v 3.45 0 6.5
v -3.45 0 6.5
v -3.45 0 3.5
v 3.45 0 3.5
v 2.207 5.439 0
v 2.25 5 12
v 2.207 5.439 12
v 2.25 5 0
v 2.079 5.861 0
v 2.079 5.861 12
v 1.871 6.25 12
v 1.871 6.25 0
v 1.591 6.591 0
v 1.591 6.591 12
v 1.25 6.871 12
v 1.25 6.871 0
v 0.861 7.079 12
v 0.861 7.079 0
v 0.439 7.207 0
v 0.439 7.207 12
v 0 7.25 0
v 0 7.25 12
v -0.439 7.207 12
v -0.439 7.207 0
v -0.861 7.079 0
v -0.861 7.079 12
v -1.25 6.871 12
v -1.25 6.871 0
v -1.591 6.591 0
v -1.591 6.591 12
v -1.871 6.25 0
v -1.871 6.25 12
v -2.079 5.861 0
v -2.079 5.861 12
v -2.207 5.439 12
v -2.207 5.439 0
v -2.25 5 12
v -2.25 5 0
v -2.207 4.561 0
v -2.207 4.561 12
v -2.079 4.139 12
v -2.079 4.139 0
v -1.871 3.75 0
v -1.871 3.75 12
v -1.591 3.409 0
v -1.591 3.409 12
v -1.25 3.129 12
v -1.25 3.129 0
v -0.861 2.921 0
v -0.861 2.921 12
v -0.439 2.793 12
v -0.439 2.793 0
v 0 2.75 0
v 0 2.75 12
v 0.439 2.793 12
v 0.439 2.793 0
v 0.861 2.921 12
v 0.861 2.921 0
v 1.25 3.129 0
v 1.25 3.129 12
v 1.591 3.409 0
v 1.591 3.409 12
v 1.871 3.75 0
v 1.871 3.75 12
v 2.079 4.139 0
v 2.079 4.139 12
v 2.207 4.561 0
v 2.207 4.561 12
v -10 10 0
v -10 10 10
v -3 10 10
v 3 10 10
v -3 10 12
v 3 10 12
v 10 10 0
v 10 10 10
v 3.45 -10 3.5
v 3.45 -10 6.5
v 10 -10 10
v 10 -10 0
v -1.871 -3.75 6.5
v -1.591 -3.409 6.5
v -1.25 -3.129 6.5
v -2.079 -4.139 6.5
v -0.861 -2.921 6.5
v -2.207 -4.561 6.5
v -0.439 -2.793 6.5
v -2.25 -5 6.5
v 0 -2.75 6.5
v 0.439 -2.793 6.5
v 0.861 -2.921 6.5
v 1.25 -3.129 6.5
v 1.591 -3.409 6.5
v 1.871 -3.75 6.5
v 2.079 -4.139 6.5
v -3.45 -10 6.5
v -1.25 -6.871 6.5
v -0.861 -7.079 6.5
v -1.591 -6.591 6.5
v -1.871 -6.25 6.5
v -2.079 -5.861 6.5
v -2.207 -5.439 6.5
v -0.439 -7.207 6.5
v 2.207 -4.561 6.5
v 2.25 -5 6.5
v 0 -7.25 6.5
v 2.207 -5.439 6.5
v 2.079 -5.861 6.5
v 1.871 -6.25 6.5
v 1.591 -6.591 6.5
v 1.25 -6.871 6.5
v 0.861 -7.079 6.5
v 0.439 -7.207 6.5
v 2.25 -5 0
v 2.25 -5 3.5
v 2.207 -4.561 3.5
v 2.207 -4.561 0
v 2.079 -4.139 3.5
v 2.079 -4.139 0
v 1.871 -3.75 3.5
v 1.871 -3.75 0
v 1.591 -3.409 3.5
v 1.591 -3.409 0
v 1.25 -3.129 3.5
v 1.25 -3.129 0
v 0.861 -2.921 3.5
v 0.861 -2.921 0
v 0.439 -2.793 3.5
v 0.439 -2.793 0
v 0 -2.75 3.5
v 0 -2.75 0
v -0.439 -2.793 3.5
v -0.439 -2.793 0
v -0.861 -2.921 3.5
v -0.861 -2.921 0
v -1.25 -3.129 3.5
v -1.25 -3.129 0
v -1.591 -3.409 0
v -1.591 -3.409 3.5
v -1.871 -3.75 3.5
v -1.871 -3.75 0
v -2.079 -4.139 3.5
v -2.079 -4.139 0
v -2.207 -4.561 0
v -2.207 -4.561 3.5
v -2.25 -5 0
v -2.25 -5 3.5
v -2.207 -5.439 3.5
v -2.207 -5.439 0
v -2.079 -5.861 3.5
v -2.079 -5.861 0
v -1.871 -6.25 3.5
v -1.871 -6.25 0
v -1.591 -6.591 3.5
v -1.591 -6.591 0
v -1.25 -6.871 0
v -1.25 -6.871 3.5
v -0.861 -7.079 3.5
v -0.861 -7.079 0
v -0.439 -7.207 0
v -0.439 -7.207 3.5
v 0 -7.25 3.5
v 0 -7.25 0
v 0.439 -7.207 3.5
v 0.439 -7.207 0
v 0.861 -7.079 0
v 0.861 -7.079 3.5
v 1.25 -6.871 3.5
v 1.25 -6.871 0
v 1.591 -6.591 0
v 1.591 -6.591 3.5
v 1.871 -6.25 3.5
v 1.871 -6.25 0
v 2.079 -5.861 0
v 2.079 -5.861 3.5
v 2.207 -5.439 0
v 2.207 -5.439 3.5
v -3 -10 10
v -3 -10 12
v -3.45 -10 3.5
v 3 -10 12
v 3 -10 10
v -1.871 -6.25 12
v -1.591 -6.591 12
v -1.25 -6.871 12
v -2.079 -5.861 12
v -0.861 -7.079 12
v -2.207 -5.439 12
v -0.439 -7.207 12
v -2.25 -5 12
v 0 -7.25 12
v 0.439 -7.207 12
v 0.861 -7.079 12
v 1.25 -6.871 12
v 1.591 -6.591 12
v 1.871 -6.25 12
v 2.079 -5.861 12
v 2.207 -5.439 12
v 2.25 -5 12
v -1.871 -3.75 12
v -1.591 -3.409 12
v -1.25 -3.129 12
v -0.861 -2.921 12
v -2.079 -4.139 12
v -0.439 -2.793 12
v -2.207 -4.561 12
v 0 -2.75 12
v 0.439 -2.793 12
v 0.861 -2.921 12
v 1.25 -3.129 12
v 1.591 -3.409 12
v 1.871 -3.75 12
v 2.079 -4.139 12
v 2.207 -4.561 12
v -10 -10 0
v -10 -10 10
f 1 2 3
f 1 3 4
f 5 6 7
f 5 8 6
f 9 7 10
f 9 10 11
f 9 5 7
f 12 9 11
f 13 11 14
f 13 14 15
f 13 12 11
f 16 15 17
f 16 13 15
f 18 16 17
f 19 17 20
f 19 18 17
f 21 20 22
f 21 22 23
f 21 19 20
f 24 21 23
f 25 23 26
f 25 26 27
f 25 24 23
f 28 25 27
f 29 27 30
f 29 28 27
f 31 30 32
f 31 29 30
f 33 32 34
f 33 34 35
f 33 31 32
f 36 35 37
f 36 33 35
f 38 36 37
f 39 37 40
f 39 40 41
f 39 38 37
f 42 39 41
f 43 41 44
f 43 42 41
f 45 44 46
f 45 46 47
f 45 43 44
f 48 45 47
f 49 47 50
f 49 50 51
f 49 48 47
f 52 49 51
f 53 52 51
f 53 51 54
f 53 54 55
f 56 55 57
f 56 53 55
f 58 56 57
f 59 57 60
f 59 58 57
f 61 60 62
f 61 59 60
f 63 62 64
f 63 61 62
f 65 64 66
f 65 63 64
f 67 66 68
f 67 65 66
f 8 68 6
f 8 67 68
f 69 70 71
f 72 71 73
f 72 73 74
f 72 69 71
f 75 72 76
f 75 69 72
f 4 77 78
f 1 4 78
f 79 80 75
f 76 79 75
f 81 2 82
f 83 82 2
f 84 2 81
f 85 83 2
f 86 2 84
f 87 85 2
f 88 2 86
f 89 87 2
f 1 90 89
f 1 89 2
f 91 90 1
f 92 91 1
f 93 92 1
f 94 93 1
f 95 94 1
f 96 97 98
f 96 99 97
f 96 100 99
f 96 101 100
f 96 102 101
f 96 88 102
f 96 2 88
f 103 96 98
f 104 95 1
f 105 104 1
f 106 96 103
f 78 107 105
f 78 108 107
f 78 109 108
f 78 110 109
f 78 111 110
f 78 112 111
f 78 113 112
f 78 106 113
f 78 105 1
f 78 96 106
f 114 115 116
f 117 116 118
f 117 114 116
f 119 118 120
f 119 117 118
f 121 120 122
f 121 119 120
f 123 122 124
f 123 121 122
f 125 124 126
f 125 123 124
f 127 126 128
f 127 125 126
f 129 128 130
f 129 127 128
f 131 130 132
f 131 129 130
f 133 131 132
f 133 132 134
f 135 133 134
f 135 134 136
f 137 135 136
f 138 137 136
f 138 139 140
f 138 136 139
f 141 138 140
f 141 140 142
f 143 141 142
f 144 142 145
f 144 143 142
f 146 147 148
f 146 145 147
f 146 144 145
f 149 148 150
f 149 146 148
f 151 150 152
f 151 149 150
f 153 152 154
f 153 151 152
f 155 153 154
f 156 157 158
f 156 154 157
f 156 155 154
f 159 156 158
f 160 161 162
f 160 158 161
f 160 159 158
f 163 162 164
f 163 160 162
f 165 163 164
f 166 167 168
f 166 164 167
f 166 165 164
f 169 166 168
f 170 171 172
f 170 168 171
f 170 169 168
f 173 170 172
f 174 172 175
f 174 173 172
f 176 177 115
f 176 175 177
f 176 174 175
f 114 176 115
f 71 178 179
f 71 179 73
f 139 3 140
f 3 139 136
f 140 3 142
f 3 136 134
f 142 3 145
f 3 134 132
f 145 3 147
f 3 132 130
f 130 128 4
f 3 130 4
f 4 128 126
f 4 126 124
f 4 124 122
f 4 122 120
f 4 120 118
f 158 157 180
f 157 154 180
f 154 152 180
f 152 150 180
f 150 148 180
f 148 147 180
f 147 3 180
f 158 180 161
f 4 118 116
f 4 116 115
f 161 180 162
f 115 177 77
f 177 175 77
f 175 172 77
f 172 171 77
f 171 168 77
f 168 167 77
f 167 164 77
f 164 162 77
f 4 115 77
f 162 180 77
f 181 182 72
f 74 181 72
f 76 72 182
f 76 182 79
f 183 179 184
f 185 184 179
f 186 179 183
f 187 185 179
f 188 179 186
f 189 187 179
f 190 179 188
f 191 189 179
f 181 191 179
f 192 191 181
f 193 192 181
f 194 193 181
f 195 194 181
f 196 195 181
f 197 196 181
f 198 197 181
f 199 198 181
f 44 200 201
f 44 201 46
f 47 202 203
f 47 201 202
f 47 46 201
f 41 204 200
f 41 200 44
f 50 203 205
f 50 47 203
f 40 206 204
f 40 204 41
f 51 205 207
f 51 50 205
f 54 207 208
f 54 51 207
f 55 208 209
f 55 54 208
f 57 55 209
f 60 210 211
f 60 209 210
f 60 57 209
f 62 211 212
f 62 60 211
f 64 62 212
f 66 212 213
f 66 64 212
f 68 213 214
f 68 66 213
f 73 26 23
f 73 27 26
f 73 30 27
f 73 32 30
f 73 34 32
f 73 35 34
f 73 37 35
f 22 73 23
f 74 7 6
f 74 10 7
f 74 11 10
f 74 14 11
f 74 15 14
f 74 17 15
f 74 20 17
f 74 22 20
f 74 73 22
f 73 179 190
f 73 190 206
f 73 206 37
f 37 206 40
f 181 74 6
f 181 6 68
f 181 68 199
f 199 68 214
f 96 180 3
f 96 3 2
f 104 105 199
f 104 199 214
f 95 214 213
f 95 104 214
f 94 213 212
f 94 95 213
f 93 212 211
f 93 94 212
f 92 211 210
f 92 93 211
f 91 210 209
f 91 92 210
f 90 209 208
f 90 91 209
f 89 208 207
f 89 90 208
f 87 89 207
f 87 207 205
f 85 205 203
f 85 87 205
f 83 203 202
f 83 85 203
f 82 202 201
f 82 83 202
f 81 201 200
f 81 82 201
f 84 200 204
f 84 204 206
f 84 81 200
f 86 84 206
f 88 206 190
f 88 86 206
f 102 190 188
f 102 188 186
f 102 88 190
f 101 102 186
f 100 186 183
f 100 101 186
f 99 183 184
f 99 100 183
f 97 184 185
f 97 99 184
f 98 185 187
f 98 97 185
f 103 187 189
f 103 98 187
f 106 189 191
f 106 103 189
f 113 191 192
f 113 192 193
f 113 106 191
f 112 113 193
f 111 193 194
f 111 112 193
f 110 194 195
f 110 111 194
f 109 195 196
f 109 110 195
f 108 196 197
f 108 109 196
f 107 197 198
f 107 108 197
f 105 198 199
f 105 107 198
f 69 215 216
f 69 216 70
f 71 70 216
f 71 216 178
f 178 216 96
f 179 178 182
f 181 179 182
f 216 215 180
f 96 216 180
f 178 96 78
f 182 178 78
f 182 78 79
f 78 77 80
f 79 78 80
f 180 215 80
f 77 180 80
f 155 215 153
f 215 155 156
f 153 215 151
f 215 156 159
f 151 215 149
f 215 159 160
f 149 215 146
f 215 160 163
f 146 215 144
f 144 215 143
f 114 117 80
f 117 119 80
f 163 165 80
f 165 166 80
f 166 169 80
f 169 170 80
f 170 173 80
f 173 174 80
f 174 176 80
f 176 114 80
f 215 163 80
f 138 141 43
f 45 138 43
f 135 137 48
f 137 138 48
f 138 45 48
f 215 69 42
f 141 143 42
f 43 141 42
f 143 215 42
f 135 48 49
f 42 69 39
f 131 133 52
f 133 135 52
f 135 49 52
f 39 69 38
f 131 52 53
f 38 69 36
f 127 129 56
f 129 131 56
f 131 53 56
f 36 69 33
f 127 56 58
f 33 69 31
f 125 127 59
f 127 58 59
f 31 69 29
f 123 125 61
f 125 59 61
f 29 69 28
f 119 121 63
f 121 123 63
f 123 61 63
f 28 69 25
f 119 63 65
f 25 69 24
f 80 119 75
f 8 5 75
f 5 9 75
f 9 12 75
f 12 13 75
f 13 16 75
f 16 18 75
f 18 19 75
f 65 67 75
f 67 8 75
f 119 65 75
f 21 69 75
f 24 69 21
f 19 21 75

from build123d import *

# Parameters (mm, degrees)
SKETCH_W     = 20
SKETCH_H     = 20
SKETCH_R     = 2.25
PAD_DEPTH    = 10
SKETCH001_W  = 6
SKETCH001_H  = 20
SKETCH001_R  = 2.25
PAD001_DEPTH = 2
SKETCH002_W  = 6.9
SKETCH002_H  = 3
POCKET_DEPTH = 10


with BuildPart() as part:
    # Sketch → Pad (new body)
    with BuildSketch(Plane.XY):
        Rectangle(SKETCH_W, SKETCH_H)
        with Locations((0, 5)):
            Circle(SKETCH_R, mode=Mode.SUBTRACT)
        with Locations((0, -5)):
            Circle(SKETCH_R, mode=Mode.SUBTRACT)
    extrude(amount=PAD_DEPTH)

    # Sketch001 → Pad001 (new body)
    with BuildSketch(Plane.XY.offset(10)):
        Rectangle(SKETCH001_W, SKETCH001_H)
        with Locations((0, 5)):
            Circle(SKETCH001_R, mode=Mode.SUBTRACT)
        with Locations((0, -5)):
            Circle(SKETCH001_R, mode=Mode.SUBTRACT)
    extrude(amount=PAD001_DEPTH)

    # Sketch002 → Pocket (cut)
    with BuildSketch(Plane.XZ.offset(10)):
        with Locations((0, 5)):
            Rectangle(SKETCH002_W, SKETCH002_H)
    extrude(amount=-POCKET_DEPTH, mode=Mode.SUBTRACT)


solid = part.part
